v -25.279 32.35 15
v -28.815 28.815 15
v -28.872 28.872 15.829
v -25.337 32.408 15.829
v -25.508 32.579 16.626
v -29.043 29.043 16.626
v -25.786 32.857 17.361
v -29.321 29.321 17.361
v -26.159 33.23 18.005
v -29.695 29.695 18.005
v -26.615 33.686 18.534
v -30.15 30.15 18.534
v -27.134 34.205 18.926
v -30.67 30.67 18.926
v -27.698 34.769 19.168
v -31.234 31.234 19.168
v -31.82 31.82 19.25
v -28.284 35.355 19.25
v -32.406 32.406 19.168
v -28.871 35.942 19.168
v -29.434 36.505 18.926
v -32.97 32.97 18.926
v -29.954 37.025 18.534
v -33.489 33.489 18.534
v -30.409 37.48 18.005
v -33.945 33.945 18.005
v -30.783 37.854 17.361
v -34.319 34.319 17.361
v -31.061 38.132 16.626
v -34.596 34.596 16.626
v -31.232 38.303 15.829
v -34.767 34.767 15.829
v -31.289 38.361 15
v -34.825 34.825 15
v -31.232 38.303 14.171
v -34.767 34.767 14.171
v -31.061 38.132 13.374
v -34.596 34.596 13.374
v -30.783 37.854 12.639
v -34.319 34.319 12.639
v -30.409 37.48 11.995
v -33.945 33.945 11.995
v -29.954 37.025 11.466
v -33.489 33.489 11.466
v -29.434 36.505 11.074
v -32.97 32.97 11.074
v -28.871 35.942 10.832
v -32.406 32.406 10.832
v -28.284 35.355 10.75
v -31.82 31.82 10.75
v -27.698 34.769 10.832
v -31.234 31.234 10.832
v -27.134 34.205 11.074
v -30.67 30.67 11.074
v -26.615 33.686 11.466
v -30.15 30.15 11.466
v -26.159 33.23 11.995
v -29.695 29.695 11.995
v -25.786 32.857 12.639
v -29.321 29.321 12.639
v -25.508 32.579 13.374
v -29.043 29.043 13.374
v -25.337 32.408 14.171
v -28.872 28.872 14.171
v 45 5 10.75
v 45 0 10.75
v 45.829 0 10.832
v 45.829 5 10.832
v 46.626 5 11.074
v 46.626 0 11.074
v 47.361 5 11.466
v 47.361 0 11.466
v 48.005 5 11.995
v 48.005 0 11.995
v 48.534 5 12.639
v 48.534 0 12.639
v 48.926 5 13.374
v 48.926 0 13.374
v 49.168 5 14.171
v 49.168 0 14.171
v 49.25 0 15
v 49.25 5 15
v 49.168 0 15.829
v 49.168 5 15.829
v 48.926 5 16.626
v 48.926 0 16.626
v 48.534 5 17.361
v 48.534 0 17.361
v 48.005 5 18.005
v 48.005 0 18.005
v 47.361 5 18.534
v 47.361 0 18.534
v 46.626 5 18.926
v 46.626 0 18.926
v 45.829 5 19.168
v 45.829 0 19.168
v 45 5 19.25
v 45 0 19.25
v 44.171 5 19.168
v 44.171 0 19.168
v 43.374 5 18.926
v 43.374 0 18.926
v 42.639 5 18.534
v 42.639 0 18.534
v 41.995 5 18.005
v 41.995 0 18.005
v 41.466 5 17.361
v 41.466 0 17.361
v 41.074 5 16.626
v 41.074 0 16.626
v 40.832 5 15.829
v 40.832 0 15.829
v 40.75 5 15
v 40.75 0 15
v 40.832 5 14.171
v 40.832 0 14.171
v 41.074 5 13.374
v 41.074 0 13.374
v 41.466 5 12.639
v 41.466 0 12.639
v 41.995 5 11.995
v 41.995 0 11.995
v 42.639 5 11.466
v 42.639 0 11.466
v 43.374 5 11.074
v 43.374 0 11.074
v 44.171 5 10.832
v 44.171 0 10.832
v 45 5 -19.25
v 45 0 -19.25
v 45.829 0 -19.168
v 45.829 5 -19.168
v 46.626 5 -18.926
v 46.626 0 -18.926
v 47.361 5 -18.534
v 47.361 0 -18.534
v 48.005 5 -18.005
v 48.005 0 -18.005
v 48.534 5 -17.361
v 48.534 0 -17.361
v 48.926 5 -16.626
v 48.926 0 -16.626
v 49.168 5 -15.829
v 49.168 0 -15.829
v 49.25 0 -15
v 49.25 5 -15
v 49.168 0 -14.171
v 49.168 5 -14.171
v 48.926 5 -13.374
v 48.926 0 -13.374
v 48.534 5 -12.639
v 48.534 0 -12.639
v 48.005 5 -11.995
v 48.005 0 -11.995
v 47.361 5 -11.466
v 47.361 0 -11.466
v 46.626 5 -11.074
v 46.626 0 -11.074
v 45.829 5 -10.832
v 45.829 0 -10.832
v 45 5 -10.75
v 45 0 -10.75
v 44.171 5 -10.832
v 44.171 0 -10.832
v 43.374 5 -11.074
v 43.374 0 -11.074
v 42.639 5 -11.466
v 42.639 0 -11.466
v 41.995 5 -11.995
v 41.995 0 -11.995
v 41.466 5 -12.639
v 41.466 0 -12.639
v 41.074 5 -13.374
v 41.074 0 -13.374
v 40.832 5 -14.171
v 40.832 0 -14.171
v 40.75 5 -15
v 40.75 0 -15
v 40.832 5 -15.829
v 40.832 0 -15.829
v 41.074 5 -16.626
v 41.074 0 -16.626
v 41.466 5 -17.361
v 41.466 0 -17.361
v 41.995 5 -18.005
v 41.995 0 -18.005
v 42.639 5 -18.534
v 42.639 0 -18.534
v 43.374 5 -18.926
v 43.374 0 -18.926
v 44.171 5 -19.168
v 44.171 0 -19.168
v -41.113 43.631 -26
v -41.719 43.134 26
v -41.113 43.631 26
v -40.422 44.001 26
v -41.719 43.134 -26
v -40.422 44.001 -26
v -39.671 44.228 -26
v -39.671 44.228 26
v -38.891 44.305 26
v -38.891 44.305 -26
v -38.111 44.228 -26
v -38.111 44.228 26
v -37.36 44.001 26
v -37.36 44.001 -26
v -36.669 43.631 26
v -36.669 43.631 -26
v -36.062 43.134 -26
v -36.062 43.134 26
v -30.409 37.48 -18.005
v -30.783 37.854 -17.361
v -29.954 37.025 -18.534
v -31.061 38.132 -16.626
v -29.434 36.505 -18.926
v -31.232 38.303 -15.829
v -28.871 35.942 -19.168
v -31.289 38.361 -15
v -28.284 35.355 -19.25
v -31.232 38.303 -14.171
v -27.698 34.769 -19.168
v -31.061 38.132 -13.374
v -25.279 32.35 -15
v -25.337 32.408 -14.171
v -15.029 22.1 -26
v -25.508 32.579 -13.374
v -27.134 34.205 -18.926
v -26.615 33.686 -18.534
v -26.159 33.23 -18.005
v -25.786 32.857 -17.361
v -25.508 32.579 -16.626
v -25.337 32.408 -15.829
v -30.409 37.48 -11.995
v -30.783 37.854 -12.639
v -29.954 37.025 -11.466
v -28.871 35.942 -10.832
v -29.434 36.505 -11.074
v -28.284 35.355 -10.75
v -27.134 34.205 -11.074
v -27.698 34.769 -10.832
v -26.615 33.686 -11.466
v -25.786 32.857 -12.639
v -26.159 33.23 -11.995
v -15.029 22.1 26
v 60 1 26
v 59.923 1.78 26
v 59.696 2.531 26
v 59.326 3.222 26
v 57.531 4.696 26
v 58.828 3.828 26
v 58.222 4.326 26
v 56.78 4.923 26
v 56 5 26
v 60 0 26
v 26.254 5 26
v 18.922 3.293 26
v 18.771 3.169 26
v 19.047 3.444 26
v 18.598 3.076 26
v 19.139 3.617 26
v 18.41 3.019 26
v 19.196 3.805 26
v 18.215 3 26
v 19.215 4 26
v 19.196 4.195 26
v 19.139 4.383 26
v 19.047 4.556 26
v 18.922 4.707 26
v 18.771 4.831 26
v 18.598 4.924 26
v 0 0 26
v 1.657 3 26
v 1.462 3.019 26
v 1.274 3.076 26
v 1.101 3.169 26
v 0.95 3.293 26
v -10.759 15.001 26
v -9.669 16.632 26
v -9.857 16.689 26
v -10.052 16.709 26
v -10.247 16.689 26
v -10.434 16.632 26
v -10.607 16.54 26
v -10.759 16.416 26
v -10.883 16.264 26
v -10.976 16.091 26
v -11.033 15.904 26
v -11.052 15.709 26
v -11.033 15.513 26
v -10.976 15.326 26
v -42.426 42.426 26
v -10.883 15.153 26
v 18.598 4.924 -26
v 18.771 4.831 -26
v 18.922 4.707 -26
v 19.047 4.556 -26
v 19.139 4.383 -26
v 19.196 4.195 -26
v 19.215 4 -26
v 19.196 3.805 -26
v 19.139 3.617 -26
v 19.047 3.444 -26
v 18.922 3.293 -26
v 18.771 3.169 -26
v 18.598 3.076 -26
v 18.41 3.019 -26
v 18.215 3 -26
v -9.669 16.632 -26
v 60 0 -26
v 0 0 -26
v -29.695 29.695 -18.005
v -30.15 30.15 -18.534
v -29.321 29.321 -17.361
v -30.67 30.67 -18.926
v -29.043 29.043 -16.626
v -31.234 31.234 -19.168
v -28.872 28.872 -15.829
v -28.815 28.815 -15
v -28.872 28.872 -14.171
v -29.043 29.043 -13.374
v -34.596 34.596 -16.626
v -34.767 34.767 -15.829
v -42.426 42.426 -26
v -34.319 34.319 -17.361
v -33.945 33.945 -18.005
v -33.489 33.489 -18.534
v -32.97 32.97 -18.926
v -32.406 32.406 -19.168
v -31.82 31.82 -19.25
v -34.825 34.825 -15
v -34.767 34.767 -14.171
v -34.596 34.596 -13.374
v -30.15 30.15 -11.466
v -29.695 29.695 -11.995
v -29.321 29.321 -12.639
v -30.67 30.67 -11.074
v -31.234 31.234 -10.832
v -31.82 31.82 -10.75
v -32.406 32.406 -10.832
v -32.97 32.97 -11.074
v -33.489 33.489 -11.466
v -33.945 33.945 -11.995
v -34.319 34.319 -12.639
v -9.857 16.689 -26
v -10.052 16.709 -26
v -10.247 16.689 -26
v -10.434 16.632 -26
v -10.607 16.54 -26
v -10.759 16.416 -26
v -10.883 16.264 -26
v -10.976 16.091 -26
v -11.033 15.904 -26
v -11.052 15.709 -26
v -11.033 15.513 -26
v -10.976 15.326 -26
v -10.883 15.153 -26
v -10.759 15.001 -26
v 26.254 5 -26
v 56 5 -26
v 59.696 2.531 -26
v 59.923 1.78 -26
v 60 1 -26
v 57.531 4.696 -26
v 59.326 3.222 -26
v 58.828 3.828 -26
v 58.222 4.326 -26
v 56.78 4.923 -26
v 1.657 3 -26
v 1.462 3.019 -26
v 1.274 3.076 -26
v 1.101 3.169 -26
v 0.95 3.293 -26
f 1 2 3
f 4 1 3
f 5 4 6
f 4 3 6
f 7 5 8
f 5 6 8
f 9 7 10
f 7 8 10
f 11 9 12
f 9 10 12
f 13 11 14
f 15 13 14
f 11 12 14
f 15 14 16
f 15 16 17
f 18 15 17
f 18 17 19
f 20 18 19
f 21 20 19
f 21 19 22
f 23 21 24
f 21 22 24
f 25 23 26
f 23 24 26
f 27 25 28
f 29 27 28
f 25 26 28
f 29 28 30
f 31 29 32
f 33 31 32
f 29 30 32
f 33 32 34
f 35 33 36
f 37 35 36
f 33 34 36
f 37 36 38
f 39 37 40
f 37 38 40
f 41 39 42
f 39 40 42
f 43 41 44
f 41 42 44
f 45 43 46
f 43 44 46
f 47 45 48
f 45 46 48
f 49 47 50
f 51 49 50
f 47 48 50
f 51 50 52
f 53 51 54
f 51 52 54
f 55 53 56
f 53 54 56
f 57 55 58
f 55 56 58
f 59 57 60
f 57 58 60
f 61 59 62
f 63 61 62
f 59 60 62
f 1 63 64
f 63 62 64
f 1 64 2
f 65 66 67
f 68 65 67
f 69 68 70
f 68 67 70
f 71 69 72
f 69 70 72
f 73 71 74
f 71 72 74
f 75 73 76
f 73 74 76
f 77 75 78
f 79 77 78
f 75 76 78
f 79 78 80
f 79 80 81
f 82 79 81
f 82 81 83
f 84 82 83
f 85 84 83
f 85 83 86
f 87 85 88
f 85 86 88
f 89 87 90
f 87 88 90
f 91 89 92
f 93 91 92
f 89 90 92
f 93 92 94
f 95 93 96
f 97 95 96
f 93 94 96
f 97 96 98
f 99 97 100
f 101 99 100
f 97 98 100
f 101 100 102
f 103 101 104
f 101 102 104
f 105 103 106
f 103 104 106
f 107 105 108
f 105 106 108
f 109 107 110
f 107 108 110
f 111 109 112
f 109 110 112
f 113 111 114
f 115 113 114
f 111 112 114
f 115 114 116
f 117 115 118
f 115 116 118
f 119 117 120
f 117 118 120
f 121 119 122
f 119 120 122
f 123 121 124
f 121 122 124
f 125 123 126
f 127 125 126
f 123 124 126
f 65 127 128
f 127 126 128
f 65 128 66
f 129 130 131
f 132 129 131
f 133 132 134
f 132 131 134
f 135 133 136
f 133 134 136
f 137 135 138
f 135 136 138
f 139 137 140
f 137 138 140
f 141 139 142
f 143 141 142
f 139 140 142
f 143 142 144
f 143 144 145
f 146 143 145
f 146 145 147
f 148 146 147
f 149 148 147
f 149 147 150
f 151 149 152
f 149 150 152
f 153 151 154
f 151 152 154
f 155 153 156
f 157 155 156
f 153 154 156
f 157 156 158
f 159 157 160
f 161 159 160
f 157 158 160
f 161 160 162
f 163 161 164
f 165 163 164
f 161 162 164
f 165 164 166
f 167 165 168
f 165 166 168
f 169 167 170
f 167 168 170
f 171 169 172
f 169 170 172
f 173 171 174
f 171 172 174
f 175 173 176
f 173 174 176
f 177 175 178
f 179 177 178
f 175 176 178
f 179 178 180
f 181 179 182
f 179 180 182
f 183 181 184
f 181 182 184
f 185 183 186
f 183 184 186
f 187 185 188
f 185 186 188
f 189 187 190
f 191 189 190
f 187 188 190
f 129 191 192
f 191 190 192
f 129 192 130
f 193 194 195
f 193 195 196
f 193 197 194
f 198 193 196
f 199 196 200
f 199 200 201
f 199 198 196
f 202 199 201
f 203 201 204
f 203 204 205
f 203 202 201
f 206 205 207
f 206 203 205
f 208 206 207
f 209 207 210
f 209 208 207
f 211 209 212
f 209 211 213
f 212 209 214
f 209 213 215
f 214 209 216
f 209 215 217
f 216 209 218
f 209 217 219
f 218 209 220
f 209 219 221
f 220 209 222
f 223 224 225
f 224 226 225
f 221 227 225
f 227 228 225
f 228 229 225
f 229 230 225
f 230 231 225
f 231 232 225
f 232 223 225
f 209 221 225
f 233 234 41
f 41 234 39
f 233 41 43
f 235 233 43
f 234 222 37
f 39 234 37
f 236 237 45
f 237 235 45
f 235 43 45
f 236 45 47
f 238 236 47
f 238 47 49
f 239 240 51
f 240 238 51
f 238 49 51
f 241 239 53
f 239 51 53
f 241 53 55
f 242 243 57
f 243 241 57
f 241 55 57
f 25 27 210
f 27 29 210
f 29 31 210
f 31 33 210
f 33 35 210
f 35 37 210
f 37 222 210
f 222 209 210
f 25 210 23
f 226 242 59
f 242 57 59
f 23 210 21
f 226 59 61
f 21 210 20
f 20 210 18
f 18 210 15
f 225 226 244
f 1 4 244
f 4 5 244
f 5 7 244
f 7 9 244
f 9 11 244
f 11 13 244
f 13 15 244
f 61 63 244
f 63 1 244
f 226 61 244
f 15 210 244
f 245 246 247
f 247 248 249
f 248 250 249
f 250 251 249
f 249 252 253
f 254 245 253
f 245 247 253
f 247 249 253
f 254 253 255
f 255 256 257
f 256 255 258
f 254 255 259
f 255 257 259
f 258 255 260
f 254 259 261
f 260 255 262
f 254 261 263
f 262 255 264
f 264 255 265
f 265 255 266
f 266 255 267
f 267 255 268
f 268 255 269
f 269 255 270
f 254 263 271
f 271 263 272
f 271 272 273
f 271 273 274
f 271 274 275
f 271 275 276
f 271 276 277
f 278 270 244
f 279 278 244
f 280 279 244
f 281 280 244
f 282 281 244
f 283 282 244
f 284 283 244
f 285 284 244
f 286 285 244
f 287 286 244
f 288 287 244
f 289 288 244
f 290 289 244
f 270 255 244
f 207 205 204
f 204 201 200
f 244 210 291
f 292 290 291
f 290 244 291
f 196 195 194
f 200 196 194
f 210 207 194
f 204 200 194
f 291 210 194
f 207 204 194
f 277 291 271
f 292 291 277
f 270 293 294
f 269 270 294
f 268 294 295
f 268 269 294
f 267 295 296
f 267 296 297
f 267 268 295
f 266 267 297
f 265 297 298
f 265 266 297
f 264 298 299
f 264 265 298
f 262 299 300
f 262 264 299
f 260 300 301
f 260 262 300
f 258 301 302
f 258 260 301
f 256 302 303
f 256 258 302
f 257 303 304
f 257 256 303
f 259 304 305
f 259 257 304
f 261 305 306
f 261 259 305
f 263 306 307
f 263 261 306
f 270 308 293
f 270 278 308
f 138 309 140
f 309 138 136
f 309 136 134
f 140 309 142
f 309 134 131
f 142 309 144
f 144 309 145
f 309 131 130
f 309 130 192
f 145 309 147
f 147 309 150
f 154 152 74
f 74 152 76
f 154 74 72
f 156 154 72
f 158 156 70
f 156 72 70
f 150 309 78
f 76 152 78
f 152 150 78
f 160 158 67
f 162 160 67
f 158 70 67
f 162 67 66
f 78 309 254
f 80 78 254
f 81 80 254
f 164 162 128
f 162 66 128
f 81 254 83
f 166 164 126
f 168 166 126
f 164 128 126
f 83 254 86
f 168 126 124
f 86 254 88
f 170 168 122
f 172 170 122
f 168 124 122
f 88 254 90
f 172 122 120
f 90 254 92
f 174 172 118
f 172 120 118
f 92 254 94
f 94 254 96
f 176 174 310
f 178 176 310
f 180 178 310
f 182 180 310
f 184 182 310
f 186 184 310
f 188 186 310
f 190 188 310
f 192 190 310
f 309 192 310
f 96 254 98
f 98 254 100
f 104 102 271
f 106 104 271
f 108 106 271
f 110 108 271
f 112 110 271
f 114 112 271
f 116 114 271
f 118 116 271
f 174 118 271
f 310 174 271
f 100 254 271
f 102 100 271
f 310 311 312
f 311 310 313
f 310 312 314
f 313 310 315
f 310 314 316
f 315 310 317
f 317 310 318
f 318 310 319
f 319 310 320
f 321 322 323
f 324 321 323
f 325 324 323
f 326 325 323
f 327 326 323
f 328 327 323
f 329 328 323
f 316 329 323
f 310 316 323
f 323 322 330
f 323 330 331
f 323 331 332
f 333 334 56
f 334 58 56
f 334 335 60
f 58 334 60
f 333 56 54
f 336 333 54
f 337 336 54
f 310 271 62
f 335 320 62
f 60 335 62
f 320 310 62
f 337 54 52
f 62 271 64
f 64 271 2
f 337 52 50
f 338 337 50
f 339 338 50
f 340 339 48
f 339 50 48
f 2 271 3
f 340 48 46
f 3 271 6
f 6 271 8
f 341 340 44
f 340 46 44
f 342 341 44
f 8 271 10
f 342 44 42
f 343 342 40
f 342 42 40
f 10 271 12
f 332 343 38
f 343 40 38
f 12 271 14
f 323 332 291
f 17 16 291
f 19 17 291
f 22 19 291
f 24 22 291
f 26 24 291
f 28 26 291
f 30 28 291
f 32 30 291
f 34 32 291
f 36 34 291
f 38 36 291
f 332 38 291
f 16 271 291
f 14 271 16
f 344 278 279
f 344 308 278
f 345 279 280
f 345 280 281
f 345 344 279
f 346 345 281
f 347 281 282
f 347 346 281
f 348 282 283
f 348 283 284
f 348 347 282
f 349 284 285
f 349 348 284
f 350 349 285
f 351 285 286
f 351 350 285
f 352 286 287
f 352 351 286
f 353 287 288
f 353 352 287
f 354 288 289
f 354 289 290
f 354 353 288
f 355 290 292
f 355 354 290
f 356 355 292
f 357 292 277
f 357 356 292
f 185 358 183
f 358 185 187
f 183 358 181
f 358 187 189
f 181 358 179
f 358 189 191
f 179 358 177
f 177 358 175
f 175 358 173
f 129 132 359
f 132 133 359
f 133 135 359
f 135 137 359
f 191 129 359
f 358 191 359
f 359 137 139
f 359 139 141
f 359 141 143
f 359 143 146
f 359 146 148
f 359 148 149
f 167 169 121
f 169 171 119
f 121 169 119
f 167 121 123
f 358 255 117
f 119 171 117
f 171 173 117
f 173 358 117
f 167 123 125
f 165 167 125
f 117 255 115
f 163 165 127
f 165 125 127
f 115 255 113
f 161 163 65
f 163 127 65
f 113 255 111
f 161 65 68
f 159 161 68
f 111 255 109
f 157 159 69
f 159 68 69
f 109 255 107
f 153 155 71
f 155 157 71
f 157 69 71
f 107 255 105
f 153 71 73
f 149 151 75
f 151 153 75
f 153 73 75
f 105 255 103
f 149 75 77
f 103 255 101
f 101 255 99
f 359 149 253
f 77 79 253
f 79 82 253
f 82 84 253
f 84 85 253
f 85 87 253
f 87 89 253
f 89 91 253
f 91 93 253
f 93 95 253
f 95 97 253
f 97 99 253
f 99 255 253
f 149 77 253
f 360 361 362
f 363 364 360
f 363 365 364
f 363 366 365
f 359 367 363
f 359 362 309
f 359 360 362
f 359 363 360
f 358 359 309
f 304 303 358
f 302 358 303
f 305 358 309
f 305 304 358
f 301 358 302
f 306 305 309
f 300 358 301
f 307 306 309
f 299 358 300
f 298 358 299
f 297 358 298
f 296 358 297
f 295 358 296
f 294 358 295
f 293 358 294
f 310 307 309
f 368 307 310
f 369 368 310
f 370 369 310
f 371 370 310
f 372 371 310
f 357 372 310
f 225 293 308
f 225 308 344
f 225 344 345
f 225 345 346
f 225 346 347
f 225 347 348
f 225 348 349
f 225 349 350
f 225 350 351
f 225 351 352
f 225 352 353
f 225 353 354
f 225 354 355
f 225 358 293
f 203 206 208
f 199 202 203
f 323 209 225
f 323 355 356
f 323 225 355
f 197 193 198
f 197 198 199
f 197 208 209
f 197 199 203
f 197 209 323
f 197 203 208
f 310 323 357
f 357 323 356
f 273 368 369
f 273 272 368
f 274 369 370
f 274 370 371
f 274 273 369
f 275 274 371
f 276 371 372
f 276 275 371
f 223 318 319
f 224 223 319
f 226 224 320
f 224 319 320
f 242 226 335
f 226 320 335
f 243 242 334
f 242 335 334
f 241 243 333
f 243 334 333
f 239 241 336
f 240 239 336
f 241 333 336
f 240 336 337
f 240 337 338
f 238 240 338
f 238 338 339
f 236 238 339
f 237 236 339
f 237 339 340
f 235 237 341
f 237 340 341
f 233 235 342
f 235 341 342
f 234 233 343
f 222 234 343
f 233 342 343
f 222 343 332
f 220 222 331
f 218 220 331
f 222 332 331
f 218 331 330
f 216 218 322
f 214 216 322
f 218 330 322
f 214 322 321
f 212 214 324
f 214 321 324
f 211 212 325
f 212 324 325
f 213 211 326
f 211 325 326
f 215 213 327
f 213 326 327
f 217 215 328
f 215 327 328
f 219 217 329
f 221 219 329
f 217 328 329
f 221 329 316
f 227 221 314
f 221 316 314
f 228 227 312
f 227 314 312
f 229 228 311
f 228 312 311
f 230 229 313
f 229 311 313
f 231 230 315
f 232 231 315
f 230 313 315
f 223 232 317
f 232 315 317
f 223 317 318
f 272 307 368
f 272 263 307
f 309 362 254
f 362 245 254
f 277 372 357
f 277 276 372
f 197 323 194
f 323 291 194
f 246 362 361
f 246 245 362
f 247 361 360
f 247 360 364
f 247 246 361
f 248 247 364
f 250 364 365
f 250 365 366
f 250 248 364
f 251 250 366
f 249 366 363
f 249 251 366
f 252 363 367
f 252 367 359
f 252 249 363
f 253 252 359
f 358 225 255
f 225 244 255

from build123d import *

# Parameters (mm, degrees)
EXTRUDE_1_DEPTH     = 26
SKETCH_2_R          = 4.25
CUT_EXTRUDE_1_DEPTH = 5
SKETCH_3_R          = 4.25
CUT_EXTRUDE_2_DEPTH = 5
FILLET_1_R          = 4
FILLET_2_R          = 1


with BuildPart() as part:
    # Эскиз1 → Бобышка-Вытянуть1 (new body, symmetric)
    with BuildSketch(Plane.XY):
        Polygon((0, 0), (-42.426406871, 42.426406871), (-38.890872965, 45.961940777), (-15.028558569, 22.099626381), (26.253591352, 5), (60, 5), (60, 0), align=None)
        Polygon((-14.313708499, 18.556349186), (23.242640687, 3), (1.242640687, 3), align=None, mode=Mode.SUBTRACT)
    extrude(amount=EXTRUDE_1_DEPTH, both=True)

    # Эскиз2 → Вырез-Вытянуть1 (cut)
    with BuildSketch(Plane(origin=(0, 0, 0), x_dir=(0, 0, 1), z_dir=(-0.707106781, -0.707106781, 0))):
        with Locations(Location((-15, 45, 0), (0, 0, 270))):  # turned: the seam where the file's is
            Circle(SKETCH_2_R)
        with Locations(Location((15, 45, 0), (0, 0, 270))):  # turned: the seam where the file's is
            Circle(SKETCH_2_R)
    extrude(amount=-CUT_EXTRUDE_1_DEPTH, mode=Mode.SUBTRACT)

    # Эскиз3 → Вырез-Вытянуть2 (cut)
    with BuildSketch(Plane.XZ):
        with Locations(Location((45, 15, 0), (0, 0, 270))):  # turned: the seam where the file's is
            Circle(SKETCH_3_R)
        with Locations(Location((45, -15, 0), (0, 0, 270))):  # turned: the seam where the file's is
            Circle(SKETCH_3_R)
    extrude(amount=-CUT_EXTRUDE_2_DEPTH, mode=Mode.SUBTRACT)

    # Скругление1
    fillet_1_edges = [part.edges().sort_by_distance(p)[0] for p in [
        (-38.890872965, 45.961940777, 0),
        (60, 5, 0),
    ]]
    fillet(fillet_1_edges, radius=FILLET_1_R)

    # Скругление2
    fillet_2_edges = [part.edges().sort_by_distance(p)[0] for p in [
        (-14.313708499, 18.556349186, 0),
        (1.242640687, 3, 0),
        (23.242640687, 3, 0),
    ]]
    fillet(fillet_2_edges, radius=FILLET_2_R)


solid = part.part
